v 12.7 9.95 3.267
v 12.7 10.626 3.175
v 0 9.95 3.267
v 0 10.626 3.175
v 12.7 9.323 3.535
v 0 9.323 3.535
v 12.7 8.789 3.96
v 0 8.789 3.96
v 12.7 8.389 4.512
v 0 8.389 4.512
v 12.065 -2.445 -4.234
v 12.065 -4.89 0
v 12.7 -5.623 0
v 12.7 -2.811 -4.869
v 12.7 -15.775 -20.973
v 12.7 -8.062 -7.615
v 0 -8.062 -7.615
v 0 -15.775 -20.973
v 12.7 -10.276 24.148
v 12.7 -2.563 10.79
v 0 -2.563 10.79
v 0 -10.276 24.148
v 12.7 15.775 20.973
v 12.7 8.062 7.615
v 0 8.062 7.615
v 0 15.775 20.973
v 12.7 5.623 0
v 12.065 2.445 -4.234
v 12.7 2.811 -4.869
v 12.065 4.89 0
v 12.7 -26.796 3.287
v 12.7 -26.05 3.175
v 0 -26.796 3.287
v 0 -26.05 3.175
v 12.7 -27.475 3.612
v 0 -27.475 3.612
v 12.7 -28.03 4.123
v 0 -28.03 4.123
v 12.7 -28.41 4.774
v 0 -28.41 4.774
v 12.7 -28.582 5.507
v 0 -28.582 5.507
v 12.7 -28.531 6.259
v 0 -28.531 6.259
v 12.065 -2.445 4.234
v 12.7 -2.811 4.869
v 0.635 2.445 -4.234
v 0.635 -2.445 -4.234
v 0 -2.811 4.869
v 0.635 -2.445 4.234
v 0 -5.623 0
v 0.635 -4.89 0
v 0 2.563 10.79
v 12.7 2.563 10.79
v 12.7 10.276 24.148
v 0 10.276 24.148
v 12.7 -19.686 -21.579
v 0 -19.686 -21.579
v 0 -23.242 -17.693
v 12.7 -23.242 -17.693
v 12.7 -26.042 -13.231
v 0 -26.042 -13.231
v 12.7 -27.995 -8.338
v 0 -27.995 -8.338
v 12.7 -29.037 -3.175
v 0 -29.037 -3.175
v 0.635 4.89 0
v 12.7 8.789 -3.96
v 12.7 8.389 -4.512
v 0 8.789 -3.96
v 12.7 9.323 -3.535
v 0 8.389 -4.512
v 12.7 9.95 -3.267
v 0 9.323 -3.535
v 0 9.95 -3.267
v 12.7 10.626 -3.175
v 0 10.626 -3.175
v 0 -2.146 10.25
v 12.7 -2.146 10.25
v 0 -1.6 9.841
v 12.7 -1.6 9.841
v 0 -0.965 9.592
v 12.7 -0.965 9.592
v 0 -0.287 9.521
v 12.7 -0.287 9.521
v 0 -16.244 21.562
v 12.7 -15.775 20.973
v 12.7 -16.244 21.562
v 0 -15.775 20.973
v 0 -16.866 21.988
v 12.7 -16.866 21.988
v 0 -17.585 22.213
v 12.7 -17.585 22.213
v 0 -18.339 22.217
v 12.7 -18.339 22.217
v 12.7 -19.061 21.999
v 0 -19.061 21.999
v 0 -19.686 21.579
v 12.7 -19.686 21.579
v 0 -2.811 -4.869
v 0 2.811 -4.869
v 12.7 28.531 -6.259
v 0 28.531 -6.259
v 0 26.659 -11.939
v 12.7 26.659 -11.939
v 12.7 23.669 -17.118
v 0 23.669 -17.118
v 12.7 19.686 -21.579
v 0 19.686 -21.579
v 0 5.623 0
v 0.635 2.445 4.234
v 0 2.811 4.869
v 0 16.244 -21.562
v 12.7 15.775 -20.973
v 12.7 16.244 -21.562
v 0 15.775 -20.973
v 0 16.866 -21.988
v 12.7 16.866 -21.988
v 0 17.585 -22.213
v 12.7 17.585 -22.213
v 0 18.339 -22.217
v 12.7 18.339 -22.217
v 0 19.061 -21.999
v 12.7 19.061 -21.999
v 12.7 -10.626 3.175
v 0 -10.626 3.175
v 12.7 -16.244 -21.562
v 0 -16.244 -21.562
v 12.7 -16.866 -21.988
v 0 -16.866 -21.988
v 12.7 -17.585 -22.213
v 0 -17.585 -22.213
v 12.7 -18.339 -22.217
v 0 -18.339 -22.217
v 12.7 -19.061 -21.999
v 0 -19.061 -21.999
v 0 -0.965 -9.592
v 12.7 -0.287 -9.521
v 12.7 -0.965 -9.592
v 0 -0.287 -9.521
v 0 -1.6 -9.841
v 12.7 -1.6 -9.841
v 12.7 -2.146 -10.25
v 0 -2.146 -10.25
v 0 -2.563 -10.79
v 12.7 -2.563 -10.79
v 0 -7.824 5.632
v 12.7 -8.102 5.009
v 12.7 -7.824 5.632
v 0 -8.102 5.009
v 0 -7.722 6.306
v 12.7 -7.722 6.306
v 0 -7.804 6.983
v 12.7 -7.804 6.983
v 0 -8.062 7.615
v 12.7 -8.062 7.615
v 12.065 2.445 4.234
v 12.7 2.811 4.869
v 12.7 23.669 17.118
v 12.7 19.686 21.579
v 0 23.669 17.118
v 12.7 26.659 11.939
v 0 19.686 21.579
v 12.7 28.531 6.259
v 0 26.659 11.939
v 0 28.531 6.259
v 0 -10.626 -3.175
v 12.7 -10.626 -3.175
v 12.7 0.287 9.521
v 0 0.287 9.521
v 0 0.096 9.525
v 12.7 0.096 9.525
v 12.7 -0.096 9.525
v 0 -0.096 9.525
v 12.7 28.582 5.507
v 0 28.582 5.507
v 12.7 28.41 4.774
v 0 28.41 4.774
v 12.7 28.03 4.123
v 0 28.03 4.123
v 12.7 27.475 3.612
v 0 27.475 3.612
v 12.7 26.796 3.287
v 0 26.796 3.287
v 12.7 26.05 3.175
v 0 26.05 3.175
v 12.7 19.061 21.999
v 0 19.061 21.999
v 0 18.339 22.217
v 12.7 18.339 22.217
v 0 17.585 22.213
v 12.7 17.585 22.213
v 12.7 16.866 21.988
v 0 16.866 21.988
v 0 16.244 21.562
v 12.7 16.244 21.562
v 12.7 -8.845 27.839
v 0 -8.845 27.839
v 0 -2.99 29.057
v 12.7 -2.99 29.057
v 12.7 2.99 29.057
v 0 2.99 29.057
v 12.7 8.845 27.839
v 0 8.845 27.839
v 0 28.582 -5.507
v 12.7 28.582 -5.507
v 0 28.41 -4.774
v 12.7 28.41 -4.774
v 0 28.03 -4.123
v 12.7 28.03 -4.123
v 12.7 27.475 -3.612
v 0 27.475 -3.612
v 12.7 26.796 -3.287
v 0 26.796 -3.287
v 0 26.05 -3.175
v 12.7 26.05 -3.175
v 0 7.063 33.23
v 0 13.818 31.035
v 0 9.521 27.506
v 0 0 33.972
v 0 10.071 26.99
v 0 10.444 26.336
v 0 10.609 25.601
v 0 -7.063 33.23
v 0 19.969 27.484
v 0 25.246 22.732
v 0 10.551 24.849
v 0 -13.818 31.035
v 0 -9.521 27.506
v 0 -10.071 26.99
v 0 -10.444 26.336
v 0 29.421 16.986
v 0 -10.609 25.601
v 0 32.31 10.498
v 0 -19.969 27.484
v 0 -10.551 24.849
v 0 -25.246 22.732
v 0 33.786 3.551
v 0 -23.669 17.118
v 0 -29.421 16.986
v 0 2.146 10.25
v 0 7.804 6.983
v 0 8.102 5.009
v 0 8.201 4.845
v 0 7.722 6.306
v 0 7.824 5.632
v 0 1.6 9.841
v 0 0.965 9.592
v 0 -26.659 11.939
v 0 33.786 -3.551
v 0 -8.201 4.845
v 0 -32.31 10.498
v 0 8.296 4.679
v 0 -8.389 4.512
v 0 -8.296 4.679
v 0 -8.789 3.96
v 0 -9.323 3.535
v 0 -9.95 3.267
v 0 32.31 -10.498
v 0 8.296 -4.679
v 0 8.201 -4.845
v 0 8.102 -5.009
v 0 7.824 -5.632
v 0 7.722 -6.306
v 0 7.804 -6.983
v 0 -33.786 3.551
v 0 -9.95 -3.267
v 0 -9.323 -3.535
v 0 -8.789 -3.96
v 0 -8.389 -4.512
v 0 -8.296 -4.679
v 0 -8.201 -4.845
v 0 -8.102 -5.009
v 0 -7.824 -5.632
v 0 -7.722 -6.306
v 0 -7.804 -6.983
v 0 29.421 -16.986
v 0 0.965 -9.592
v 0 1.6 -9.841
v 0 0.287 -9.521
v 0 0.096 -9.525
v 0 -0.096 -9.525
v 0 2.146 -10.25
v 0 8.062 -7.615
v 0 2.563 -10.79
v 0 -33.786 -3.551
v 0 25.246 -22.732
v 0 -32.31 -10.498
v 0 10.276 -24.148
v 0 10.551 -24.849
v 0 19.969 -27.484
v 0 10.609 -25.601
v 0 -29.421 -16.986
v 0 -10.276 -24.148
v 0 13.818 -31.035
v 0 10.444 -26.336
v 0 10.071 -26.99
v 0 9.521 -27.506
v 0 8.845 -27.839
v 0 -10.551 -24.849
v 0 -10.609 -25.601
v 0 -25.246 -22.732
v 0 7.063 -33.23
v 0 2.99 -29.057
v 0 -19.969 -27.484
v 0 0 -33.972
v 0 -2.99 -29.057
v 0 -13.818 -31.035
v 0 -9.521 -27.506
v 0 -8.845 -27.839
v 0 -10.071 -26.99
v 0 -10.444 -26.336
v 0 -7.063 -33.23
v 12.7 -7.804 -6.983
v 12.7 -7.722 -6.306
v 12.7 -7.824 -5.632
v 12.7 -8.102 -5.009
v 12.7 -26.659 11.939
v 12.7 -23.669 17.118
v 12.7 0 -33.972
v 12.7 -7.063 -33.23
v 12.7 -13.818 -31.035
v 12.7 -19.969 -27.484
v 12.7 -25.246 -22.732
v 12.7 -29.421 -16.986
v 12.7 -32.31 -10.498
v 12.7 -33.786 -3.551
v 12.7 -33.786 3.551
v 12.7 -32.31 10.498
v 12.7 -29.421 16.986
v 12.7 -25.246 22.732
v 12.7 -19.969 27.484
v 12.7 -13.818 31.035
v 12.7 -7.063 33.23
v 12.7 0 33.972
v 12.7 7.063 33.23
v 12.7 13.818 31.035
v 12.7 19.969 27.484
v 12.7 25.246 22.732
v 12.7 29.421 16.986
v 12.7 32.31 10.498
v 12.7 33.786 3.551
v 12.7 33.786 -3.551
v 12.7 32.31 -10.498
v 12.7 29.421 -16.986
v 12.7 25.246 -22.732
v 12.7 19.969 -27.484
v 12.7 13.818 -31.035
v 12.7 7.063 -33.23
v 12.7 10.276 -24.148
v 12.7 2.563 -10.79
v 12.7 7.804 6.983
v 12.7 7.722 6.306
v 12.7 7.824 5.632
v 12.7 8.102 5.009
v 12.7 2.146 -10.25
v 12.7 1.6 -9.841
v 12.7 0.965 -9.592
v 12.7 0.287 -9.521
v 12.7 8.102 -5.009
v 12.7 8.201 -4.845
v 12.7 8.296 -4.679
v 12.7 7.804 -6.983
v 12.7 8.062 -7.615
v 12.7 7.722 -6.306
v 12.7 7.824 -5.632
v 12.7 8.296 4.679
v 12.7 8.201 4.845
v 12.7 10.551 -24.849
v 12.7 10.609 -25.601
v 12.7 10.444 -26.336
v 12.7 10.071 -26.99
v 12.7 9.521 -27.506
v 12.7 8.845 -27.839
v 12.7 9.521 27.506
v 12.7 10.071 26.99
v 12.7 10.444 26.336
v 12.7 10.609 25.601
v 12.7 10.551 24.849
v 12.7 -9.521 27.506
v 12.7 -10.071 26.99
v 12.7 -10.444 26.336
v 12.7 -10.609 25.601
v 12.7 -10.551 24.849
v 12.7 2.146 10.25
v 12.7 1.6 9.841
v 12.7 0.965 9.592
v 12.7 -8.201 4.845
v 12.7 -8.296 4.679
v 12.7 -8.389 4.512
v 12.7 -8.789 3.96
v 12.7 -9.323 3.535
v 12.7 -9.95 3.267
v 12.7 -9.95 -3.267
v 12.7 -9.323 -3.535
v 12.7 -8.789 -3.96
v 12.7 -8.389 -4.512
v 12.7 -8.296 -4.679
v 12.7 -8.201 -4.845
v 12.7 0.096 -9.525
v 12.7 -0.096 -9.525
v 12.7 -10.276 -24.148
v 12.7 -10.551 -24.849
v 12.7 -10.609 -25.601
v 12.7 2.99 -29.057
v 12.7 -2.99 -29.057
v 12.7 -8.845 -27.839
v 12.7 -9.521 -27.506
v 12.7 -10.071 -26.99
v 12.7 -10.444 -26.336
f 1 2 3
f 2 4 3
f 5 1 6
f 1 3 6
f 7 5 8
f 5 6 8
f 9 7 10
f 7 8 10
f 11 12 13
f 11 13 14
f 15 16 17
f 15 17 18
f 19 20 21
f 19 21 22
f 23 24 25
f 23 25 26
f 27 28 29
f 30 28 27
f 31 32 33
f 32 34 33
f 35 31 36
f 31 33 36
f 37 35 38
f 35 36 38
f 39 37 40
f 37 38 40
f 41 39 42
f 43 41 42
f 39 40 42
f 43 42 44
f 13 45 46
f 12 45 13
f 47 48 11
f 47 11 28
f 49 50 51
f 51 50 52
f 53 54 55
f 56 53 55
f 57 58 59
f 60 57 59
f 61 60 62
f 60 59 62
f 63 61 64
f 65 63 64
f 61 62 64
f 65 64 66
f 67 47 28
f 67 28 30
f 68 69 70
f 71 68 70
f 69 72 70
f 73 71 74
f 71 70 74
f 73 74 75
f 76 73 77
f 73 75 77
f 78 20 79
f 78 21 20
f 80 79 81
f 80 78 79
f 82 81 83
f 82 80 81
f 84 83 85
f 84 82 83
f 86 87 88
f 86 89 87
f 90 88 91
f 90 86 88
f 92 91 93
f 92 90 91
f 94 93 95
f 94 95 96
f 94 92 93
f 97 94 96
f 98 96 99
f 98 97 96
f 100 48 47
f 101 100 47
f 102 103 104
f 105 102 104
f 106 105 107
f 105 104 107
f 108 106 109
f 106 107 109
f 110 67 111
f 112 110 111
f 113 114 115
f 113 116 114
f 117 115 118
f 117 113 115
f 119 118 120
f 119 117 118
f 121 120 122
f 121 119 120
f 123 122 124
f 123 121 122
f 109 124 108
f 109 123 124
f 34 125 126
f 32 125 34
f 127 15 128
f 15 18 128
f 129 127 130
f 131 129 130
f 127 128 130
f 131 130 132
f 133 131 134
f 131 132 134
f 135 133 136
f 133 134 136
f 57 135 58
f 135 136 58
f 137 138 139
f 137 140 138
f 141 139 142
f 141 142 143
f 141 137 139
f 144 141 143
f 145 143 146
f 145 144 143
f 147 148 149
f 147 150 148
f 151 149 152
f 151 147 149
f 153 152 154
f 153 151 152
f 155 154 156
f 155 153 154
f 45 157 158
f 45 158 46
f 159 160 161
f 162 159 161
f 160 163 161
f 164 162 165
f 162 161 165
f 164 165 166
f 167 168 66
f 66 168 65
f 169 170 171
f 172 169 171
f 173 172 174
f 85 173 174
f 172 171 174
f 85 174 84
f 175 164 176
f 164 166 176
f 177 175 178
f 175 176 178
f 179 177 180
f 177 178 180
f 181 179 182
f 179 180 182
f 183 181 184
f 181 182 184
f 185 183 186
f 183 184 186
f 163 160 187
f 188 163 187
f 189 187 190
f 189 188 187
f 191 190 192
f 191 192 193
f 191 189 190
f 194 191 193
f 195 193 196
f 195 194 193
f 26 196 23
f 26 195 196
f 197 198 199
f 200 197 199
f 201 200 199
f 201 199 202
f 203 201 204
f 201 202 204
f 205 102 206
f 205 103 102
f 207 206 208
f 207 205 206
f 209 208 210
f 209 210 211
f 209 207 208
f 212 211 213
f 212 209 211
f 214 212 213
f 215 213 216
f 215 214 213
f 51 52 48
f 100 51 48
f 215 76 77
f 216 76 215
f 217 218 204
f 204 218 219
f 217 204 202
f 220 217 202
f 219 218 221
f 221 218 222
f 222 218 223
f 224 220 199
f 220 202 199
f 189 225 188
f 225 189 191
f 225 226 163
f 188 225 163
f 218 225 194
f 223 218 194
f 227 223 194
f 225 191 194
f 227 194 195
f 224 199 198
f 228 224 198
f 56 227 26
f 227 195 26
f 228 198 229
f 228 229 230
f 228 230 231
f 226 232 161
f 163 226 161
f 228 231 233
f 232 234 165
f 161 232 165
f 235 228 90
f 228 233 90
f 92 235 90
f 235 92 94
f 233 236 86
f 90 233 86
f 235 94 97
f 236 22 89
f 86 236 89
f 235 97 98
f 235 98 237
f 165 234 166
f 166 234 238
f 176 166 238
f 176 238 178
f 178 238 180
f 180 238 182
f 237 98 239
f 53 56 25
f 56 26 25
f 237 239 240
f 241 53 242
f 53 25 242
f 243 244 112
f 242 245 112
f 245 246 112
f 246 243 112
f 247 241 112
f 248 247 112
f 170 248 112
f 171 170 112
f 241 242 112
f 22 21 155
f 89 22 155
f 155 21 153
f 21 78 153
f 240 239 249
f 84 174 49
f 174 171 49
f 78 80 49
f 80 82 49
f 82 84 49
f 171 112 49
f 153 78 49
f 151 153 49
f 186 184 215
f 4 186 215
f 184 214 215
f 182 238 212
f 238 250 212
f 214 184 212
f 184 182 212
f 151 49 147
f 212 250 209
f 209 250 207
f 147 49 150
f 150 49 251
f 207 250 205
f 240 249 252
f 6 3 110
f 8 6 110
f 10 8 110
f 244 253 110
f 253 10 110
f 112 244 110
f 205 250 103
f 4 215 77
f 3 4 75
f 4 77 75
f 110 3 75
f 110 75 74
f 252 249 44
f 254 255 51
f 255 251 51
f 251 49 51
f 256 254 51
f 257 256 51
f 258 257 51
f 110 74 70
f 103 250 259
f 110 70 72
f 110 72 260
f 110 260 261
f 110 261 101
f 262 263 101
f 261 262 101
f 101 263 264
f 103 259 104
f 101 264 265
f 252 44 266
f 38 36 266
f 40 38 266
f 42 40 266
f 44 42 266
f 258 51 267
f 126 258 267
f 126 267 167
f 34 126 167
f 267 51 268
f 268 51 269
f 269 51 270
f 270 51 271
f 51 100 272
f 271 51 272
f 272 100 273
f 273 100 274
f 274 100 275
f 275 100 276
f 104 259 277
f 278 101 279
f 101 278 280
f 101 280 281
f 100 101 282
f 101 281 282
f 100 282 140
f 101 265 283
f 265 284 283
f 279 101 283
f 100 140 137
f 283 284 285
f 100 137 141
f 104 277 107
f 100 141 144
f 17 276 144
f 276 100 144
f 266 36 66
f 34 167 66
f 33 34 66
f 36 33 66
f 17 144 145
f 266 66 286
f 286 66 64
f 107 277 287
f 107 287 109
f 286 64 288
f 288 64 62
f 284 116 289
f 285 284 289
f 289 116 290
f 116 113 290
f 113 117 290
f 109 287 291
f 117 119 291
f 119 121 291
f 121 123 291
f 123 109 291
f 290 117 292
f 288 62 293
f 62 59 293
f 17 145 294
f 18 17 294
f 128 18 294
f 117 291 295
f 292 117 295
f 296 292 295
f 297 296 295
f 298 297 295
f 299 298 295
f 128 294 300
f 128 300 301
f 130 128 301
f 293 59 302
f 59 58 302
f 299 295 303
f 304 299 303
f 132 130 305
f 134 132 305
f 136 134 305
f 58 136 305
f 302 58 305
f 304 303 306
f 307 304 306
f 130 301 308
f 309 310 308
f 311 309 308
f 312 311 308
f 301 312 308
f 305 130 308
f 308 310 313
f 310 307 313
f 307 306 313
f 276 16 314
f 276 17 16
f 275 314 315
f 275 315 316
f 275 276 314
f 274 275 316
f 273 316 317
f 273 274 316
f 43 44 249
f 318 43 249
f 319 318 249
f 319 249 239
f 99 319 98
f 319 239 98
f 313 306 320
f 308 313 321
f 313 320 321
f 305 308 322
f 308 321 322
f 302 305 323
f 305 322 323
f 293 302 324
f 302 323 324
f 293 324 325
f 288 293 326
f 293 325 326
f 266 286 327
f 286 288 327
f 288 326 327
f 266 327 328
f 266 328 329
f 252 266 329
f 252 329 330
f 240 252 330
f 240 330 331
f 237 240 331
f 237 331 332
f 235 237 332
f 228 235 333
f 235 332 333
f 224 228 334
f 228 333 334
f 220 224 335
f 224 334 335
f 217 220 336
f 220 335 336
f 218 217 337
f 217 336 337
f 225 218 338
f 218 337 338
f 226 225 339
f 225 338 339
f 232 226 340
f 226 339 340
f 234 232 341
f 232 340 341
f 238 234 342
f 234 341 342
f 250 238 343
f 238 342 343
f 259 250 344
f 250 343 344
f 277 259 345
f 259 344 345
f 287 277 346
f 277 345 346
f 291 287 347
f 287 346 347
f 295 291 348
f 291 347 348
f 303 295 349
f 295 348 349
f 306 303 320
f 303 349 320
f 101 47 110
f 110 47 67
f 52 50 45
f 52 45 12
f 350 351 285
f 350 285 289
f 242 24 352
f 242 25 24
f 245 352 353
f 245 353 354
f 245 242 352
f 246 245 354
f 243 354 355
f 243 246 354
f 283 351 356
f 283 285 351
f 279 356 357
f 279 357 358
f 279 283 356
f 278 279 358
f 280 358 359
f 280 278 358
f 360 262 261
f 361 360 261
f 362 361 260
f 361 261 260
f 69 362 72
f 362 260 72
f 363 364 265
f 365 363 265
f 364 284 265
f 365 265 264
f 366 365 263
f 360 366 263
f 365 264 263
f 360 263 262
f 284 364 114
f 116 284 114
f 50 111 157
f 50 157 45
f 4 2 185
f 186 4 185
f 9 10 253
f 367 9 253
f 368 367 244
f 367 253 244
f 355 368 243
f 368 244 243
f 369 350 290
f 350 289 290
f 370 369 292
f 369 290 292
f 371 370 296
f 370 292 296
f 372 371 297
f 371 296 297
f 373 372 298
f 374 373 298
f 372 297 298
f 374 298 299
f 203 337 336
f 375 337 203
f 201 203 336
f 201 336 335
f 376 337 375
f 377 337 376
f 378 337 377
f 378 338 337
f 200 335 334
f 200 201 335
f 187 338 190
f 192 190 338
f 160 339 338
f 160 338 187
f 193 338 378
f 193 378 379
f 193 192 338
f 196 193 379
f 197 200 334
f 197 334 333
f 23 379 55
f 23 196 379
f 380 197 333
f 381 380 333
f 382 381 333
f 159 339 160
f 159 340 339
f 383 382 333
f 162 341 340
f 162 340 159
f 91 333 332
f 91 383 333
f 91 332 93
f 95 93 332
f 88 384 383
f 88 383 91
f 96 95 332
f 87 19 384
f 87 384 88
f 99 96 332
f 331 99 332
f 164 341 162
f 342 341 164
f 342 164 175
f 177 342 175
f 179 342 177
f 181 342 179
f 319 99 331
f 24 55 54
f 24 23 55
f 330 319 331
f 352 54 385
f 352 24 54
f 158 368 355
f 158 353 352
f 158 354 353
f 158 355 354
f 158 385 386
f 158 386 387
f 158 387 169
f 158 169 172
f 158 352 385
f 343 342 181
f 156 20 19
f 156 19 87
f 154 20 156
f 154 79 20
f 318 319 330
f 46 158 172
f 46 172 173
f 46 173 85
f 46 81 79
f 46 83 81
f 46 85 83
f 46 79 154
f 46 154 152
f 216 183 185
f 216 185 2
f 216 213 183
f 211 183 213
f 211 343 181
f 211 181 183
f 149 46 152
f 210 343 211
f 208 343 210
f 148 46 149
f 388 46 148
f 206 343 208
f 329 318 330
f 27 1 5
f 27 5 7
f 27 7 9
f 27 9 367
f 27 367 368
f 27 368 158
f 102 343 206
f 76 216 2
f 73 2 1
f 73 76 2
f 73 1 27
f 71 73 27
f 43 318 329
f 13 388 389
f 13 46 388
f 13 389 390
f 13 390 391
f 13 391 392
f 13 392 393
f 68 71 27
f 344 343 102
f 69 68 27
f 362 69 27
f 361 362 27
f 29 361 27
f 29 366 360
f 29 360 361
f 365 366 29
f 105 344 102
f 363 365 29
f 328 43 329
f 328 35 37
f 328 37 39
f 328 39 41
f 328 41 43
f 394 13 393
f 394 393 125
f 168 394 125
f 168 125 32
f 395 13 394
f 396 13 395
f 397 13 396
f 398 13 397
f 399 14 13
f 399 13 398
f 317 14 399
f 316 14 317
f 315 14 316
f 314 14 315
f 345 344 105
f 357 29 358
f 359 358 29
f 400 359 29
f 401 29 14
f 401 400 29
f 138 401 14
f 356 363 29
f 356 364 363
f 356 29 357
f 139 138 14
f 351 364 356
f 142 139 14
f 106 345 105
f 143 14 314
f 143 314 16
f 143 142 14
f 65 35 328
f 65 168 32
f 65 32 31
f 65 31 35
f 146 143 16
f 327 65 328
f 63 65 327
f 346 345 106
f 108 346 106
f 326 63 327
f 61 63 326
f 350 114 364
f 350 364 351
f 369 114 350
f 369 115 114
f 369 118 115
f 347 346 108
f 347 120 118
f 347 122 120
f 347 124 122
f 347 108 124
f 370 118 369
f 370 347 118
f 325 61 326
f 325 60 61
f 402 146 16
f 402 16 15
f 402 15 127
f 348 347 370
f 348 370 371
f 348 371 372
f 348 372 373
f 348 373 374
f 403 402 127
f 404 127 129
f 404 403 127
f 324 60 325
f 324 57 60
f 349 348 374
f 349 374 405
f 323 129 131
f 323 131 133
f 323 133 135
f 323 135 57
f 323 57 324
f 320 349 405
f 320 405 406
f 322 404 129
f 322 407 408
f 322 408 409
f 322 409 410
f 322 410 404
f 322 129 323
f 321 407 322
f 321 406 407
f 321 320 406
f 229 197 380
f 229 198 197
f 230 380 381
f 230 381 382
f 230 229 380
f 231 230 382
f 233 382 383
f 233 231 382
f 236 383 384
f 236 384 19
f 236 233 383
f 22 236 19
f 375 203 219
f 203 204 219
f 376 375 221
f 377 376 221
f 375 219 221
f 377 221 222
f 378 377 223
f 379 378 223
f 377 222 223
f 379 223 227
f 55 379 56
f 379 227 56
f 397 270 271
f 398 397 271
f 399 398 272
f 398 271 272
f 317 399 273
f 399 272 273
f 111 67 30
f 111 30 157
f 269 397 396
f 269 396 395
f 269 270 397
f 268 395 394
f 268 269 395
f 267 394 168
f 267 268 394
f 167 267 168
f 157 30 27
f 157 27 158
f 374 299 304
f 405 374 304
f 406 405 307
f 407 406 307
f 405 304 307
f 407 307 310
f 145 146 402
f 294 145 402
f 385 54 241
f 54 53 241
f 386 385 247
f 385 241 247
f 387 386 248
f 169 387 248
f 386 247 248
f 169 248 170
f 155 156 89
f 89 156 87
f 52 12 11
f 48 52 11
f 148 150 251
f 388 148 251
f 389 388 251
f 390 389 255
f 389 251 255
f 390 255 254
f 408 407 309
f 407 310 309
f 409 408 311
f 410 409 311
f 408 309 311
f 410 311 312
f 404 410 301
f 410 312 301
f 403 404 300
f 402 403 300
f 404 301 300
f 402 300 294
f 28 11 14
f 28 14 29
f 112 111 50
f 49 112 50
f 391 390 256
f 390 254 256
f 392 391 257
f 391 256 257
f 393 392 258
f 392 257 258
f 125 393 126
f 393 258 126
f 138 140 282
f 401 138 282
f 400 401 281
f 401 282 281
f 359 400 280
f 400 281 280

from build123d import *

# Parameters (mm, degrees)
AXLE_PROFILE_R              = 9.525
WHEEL_HUB_DEPTH             = 12.7
WHEEL_RIM_REACH             = 16.892
SKETCH3_R                   = 33.9725
SKETCH3_R_2                 = 29.21
WHEEL_RIM_DIRECTION_2_REACH = 16.892
SKETCH4_W                   = 6.35
SKETCH4_H                   = 20.229743879
BOSS_EXTRUDE1_DEPTH         = 12.7
SPOKES_COUNT                = 6
SPOKE_FILLETS_R             = 2.54
SHAFT_CHAMFERS_SIZE         = 0.635


with BuildPart() as part:
    # Axle Profile → Wheel Hub (new body)
    with BuildSketch(Plane(origin=(0, 0, 0), x_dir=(0, 0, -1), z_dir=(1, 0, 0))):
        Circle(AXLE_PROFILE_R)
        Polygon((0, -4.8895), (4.234431212, -2.44475), (4.234431212, 2.44475), (0, 4.8895), (-4.234431212, 2.44475), (-4.234431212, -2.44475), align=None, mode=Mode.SUBTRACT)
    extrude(amount=WHEEL_HUB_DEPTH)

    # Wheel Rim: up to this face of the body (flat: up to its plane)
    wheel_rim_end = Plane(part.part.faces().sort_by_distance((0, 0, 9.255592316))[0])
    # Sketch3 → Wheel Rim (add, up to the picked face)
    with BuildSketch(Plane.ZY.offset(-6.35), mode=Mode.PRIVATE) as wheel_rim_sk1:
        with Locations(Location((0, 0, 0), (0, 0, 180))):
            Circle(SKETCH3_R)
        with Locations(Location((0, 0, 0), (0, 0, 180))):
            Circle(SKETCH3_R_2, mode=Mode.SUBTRACT)
    wheel_rim_tool1 = split(extrude(wheel_rim_sk1.sketch, amount=WHEEL_RIM_REACH, mode=Mode.PRIVATE), bisect_by=wheel_rim_end, keep=Keep.BOTH, mode=Mode.PRIVATE)
    add(wheel_rim_tool1.solids().sort_by(Axis((6.35, 0, 33.011613), (-1, 0, 0)))[0])

    # Wheel Rim direction 2: up to this face of the body (flat: up to its plane)
    wheel_rim_direction_2_end = Plane(part.part.faces().sort_by_distance((12.7, 0, 9.255592316))[0])
    # Sketch3 → Wheel Rim direction 2 (add, up to the picked face)
    with BuildSketch(Plane.ZY.offset(-6.35), mode=Mode.PRIVATE) as wheel_rim_direction_2_sk1:
        with Locations(Location((0, 0, 0), (0, 0, 180))):
            Circle(SKETCH3_R)
        with Locations(Location((0, 0, 0), (0, 0, 180))):
            Circle(SKETCH3_R_2, mode=Mode.SUBTRACT)
    wheel_rim_direction_2_tool1 = split(extrude(wheel_rim_direction_2_sk1.sketch, amount=-WHEEL_RIM_DIRECTION_2_REACH, mode=Mode.PRIVATE), bisect_by=wheel_rim_direction_2_end, keep=Keep.BOTH, mode=Mode.PRIVATE)
    add(wheel_rim_direction_2_tool1.solids().sort_by(Axis((6.35, 0, 33.011613), (1, 0, 0)))[0])

    # Sketch4 → Boss-Extrude1 (add)
    with BuildSketch(Plane(origin=(12.7, 0, 0), x_dir=(0, 0, -1), z_dir=(1, 0, 0))):
        with Locations((0, 19.095128061)):
            Rectangle(SKETCH4_W, SKETCH4_H)
    boss_extrude1 = extrude(amount=-BOSS_EXTRUDE1_DEPTH)

    # Spokes: Boss-Extrude1 ×6 about axis
    spokes_axis = Axis((0, 0, 0), (1, 0, 0))
    for i in range(1, SPOKES_COUNT):
        add(boss_extrude1.rotate(spokes_axis, i * 360 / SPOKES_COUNT))

    # Spoke Fillets
    spoke_fillets_edges = [part.edges().sort_by_distance(p)[0] for p in [
        (6.35, 7.239758718, -6.189629933),
        (6.35, 1.740497404, -9.364629933),
        (6.35, -1.740497404, -9.364629933),
        (6.35, -7.239758718, -6.189629933),
        (6.35, -8.980256121, -3.175),
        (6.35, -8.980256121, 3.175),
        (6.35, -7.239758718, 6.189629933),
        (6.35, -1.740497404, 9.364629933),
        (6.35, 1.740497404, 9.364629933),
        (6.35, 7.239758718, 6.189629933),
        (6.35, 8.980256121, 3.175),
        (6.35, 8.980256121, -3.175),
        (9.525, 29.036932948, -3.175),
        (9.525, 29.036932948, 3.175),
        (3.175, 17.268097131, 23.559221581),
        (3.175, 11.768835817, 26.734221581),
        (9.525, -11.768835817, 26.734221581),
        (9.525, -17.268097131, 23.559221581),
        (9.525, -29.036932948, 3.175),
        (3.175, -17.268097131, -23.559221581),
        (3.175, -11.768835817, -26.734221581),
        (9.525, 11.768835817, -26.734221581),
        (3.175, 17.268097131, -23.559221581),
    ]]
    fillet(spoke_fillets_edges, radius=SPOKE_FILLETS_R)

    # Shaft Chamfers
    shaft_chamfers_edges = [part.edges().sort_by_distance(p)[0] for p in [
        (0, 0, -4.234431212),
        (0, 3.667125, -2.117215606),
        (0, 3.667125, 2.117215606),
        (0, 0, 4.234431212),
        (12.7, -3.667125, 2.117215606),
        (12.7, -3.667125, -2.117215606),
        (12.7, 0, -4.234431212),
        (12.7, 3.667125, -2.117215606),
        (12.7, 3.667125, 2.117215606),
        (12.7, 0, 4.234431212),
        (0, -3.667125, 2.117215606),
        (0, -3.667125, -2.117215606),
    ]]
    chamfer(shaft_chamfers_edges, length=SHAFT_CHAMFERS_SIZE)


solid = part.part
